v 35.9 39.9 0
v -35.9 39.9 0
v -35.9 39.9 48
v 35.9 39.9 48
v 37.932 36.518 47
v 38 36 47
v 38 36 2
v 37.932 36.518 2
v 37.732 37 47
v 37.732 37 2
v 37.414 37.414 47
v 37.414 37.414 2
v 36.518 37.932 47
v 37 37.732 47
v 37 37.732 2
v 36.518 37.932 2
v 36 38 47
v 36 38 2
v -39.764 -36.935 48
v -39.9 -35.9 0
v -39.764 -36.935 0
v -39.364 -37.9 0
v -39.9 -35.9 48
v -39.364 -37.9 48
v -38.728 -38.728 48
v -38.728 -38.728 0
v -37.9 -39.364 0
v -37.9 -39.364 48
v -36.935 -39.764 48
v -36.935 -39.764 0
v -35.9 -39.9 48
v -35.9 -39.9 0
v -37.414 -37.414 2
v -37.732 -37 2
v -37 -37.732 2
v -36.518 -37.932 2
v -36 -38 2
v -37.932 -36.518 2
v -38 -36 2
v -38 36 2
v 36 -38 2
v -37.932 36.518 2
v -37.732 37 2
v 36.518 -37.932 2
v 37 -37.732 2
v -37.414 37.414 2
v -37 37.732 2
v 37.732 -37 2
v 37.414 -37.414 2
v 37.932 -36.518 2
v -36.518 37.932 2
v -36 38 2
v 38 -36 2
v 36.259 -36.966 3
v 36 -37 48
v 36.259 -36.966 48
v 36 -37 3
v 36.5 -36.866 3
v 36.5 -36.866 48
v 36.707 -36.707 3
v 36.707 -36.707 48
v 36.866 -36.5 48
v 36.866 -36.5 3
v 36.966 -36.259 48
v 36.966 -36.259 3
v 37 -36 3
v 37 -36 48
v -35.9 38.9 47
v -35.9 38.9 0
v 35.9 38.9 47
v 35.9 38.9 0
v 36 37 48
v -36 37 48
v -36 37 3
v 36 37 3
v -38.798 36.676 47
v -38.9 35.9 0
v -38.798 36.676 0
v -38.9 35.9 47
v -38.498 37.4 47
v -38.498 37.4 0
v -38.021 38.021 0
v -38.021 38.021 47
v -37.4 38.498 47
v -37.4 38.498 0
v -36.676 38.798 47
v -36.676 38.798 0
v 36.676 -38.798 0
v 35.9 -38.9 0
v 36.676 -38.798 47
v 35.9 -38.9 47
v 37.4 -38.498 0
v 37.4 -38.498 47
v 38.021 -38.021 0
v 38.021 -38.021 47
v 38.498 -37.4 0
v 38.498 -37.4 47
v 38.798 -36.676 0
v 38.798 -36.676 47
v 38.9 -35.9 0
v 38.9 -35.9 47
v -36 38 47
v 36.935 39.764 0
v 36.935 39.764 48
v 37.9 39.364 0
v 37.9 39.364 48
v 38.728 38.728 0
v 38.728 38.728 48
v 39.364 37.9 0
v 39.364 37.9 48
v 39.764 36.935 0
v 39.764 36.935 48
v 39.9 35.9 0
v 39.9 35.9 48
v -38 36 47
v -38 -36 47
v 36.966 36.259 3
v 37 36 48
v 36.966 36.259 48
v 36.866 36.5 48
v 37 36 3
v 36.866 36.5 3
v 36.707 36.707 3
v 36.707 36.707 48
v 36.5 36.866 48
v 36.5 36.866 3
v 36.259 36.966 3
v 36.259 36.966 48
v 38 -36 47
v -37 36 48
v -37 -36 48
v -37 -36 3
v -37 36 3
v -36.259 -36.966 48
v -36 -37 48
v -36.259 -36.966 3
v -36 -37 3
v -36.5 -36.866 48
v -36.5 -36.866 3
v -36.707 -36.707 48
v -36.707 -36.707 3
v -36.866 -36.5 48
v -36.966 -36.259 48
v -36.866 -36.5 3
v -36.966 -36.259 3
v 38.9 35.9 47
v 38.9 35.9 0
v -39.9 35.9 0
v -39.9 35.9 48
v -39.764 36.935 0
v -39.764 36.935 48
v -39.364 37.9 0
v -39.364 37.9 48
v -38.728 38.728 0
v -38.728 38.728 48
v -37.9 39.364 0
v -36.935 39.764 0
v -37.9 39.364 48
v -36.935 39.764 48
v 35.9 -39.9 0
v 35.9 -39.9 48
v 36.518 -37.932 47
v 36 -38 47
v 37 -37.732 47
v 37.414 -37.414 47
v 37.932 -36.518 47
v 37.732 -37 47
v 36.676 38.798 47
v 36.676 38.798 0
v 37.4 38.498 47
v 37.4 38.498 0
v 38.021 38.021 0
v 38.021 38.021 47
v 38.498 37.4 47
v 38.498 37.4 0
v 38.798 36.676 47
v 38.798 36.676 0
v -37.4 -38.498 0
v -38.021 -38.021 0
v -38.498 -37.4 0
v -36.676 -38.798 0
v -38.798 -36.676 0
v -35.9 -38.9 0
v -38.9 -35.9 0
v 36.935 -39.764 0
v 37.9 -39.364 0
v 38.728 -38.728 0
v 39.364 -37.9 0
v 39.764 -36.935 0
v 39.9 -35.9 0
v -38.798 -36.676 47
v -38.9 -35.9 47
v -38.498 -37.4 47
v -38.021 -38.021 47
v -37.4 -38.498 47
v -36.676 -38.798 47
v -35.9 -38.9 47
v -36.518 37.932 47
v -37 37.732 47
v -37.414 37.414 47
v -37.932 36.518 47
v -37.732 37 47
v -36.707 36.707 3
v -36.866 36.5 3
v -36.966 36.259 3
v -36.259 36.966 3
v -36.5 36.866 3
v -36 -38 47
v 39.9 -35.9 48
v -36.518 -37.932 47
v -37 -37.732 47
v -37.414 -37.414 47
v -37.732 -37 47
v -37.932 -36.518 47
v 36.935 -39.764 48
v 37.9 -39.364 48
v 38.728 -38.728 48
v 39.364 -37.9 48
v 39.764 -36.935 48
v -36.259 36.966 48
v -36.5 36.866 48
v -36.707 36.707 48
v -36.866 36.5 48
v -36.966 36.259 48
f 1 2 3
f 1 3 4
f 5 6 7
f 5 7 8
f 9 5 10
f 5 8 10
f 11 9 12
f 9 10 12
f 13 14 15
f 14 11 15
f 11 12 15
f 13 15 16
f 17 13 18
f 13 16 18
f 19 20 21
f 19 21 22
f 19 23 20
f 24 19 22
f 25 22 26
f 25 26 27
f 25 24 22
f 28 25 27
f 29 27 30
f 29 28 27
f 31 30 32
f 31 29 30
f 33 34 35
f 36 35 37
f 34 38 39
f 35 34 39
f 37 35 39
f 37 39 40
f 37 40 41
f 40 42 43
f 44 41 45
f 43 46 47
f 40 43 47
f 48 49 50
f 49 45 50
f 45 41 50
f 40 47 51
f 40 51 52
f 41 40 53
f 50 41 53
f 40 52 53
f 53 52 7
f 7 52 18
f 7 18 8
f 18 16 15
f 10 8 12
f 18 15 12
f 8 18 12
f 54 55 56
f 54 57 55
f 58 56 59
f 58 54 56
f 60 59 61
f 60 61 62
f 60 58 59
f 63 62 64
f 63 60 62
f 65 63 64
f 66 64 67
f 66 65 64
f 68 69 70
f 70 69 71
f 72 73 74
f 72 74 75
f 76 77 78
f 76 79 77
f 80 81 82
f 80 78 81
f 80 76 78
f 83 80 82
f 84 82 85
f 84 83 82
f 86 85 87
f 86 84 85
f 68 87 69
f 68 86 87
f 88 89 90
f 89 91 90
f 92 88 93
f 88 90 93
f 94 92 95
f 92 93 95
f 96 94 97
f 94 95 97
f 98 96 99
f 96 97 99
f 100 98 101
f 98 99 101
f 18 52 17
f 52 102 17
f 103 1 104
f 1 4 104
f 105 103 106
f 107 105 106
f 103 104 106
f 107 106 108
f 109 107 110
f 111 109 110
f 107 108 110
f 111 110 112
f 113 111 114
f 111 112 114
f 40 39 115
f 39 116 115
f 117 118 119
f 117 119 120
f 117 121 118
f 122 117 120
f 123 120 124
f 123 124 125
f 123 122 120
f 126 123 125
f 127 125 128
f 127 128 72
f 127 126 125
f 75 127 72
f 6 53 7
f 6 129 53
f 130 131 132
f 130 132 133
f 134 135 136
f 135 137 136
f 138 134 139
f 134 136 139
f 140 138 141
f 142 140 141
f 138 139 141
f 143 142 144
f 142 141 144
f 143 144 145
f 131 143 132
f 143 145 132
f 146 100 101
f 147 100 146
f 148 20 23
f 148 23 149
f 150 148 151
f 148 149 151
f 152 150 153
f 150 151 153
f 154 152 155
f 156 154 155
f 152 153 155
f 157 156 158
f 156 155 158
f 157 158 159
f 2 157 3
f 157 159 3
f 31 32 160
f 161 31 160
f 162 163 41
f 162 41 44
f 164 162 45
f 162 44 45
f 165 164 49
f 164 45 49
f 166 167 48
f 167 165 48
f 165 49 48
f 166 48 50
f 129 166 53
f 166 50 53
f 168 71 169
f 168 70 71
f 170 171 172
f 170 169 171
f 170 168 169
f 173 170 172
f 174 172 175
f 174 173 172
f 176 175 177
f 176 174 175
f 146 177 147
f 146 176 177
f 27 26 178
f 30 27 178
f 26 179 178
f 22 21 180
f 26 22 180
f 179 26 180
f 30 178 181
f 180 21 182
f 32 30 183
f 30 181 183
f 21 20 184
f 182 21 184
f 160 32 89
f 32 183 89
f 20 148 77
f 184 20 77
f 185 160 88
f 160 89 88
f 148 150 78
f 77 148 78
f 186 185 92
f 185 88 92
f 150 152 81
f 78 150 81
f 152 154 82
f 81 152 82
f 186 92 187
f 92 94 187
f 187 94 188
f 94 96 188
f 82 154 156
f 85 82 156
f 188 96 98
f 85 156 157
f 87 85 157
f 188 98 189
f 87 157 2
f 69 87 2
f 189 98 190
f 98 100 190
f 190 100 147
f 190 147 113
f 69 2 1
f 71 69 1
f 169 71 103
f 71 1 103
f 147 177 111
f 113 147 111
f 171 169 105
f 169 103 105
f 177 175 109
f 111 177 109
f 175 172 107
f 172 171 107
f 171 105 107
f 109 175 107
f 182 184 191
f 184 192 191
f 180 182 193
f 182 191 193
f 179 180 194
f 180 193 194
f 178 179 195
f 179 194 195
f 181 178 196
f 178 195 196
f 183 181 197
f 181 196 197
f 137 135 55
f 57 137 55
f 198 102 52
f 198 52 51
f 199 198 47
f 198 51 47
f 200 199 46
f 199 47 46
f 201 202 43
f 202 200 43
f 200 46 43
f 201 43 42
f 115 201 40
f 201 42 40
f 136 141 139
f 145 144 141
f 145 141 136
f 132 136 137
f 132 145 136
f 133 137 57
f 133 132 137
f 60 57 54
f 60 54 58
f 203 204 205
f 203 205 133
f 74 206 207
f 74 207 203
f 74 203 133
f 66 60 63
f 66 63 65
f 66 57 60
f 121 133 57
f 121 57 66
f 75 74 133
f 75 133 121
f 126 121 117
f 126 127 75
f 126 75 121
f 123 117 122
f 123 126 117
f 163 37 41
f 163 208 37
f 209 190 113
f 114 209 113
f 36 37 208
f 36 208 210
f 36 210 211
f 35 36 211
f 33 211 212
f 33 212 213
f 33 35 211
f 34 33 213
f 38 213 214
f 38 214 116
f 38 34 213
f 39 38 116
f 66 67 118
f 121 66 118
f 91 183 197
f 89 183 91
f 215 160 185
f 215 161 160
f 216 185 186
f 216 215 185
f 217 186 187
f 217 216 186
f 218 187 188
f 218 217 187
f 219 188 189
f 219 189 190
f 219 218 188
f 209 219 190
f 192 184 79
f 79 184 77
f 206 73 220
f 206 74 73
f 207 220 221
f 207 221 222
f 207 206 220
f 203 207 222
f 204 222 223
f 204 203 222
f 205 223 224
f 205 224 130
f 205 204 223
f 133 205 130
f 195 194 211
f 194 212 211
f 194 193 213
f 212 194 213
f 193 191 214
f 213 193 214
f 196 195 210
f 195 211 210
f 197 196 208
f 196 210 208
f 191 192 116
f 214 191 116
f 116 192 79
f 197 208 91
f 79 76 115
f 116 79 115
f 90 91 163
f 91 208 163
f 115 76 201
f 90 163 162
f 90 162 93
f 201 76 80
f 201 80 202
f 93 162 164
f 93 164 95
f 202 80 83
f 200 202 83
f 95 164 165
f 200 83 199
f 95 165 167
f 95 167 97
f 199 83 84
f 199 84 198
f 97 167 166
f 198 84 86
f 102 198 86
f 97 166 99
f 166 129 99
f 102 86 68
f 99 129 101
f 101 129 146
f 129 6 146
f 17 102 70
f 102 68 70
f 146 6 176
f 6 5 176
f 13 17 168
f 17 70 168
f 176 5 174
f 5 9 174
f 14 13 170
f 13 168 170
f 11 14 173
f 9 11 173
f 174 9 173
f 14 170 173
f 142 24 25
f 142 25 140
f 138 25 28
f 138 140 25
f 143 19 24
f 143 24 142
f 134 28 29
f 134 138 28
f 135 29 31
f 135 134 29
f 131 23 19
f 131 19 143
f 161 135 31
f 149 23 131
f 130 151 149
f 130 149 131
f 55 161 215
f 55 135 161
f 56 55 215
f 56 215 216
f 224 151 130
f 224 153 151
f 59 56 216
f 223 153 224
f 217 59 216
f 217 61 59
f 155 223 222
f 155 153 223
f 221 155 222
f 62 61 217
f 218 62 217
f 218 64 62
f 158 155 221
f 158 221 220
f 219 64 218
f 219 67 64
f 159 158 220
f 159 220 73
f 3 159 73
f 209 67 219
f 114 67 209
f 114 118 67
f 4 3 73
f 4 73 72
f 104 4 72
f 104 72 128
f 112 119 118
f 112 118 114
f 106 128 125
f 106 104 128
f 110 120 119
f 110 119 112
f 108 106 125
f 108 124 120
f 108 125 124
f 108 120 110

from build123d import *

# Parameters (mm, degrees)
F0_W     = 79.8
F0_H     = 79.8
F1_DEPTH = 48
F2_W     = 74
F2_H     = 74
F3_DEPTH = 45
F4_R     = 4
F5_R     = 1
F6_T     = -1


with BuildPart() as f1:
    # F0 (on Top) → F1 (new body)
    with BuildSketch(Plane.XY):
        Rectangle(F0_W, F0_H)
    extrude(amount=F1_DEPTH)

    # F2 (on face) → F3 (cut)
    with BuildSketch(Plane.XY.offset(48)):
        Rectangle(F2_W, F2_H)
    extrude(amount=-F3_DEPTH, mode=Mode.SUBTRACT)

    # F4
    f4_edges = [f1.edges().sort_by_distance(p)[0] for p in [
        (-39.9, -39.9, 24),
        (39.9, -39.9, 24),
        (39.9, 39.9, 24),
        (-39.9, 39.9, 24),
    ]]
    fillet(f4_edges, radius=F4_R)

    # F5
    f5_edges = [f1.edges().sort_by_distance(p)[0] for p in [
        (-37, -37, 25.5),
        (-37, 37, 25.5),
        (37, 37, 25.5),
        (37, -37, 25.5),
    ]]
    fillet(f5_edges, radius=F5_R)

    # F6
    f6_openings = [f1.faces().sort_by_distance(p)[0] for p in [
        (0, 0, 0),
    ]]
    offset(amount=F6_T, openings=f6_openings, kind=Kind.INTERSECTION)


solid = f1.part
